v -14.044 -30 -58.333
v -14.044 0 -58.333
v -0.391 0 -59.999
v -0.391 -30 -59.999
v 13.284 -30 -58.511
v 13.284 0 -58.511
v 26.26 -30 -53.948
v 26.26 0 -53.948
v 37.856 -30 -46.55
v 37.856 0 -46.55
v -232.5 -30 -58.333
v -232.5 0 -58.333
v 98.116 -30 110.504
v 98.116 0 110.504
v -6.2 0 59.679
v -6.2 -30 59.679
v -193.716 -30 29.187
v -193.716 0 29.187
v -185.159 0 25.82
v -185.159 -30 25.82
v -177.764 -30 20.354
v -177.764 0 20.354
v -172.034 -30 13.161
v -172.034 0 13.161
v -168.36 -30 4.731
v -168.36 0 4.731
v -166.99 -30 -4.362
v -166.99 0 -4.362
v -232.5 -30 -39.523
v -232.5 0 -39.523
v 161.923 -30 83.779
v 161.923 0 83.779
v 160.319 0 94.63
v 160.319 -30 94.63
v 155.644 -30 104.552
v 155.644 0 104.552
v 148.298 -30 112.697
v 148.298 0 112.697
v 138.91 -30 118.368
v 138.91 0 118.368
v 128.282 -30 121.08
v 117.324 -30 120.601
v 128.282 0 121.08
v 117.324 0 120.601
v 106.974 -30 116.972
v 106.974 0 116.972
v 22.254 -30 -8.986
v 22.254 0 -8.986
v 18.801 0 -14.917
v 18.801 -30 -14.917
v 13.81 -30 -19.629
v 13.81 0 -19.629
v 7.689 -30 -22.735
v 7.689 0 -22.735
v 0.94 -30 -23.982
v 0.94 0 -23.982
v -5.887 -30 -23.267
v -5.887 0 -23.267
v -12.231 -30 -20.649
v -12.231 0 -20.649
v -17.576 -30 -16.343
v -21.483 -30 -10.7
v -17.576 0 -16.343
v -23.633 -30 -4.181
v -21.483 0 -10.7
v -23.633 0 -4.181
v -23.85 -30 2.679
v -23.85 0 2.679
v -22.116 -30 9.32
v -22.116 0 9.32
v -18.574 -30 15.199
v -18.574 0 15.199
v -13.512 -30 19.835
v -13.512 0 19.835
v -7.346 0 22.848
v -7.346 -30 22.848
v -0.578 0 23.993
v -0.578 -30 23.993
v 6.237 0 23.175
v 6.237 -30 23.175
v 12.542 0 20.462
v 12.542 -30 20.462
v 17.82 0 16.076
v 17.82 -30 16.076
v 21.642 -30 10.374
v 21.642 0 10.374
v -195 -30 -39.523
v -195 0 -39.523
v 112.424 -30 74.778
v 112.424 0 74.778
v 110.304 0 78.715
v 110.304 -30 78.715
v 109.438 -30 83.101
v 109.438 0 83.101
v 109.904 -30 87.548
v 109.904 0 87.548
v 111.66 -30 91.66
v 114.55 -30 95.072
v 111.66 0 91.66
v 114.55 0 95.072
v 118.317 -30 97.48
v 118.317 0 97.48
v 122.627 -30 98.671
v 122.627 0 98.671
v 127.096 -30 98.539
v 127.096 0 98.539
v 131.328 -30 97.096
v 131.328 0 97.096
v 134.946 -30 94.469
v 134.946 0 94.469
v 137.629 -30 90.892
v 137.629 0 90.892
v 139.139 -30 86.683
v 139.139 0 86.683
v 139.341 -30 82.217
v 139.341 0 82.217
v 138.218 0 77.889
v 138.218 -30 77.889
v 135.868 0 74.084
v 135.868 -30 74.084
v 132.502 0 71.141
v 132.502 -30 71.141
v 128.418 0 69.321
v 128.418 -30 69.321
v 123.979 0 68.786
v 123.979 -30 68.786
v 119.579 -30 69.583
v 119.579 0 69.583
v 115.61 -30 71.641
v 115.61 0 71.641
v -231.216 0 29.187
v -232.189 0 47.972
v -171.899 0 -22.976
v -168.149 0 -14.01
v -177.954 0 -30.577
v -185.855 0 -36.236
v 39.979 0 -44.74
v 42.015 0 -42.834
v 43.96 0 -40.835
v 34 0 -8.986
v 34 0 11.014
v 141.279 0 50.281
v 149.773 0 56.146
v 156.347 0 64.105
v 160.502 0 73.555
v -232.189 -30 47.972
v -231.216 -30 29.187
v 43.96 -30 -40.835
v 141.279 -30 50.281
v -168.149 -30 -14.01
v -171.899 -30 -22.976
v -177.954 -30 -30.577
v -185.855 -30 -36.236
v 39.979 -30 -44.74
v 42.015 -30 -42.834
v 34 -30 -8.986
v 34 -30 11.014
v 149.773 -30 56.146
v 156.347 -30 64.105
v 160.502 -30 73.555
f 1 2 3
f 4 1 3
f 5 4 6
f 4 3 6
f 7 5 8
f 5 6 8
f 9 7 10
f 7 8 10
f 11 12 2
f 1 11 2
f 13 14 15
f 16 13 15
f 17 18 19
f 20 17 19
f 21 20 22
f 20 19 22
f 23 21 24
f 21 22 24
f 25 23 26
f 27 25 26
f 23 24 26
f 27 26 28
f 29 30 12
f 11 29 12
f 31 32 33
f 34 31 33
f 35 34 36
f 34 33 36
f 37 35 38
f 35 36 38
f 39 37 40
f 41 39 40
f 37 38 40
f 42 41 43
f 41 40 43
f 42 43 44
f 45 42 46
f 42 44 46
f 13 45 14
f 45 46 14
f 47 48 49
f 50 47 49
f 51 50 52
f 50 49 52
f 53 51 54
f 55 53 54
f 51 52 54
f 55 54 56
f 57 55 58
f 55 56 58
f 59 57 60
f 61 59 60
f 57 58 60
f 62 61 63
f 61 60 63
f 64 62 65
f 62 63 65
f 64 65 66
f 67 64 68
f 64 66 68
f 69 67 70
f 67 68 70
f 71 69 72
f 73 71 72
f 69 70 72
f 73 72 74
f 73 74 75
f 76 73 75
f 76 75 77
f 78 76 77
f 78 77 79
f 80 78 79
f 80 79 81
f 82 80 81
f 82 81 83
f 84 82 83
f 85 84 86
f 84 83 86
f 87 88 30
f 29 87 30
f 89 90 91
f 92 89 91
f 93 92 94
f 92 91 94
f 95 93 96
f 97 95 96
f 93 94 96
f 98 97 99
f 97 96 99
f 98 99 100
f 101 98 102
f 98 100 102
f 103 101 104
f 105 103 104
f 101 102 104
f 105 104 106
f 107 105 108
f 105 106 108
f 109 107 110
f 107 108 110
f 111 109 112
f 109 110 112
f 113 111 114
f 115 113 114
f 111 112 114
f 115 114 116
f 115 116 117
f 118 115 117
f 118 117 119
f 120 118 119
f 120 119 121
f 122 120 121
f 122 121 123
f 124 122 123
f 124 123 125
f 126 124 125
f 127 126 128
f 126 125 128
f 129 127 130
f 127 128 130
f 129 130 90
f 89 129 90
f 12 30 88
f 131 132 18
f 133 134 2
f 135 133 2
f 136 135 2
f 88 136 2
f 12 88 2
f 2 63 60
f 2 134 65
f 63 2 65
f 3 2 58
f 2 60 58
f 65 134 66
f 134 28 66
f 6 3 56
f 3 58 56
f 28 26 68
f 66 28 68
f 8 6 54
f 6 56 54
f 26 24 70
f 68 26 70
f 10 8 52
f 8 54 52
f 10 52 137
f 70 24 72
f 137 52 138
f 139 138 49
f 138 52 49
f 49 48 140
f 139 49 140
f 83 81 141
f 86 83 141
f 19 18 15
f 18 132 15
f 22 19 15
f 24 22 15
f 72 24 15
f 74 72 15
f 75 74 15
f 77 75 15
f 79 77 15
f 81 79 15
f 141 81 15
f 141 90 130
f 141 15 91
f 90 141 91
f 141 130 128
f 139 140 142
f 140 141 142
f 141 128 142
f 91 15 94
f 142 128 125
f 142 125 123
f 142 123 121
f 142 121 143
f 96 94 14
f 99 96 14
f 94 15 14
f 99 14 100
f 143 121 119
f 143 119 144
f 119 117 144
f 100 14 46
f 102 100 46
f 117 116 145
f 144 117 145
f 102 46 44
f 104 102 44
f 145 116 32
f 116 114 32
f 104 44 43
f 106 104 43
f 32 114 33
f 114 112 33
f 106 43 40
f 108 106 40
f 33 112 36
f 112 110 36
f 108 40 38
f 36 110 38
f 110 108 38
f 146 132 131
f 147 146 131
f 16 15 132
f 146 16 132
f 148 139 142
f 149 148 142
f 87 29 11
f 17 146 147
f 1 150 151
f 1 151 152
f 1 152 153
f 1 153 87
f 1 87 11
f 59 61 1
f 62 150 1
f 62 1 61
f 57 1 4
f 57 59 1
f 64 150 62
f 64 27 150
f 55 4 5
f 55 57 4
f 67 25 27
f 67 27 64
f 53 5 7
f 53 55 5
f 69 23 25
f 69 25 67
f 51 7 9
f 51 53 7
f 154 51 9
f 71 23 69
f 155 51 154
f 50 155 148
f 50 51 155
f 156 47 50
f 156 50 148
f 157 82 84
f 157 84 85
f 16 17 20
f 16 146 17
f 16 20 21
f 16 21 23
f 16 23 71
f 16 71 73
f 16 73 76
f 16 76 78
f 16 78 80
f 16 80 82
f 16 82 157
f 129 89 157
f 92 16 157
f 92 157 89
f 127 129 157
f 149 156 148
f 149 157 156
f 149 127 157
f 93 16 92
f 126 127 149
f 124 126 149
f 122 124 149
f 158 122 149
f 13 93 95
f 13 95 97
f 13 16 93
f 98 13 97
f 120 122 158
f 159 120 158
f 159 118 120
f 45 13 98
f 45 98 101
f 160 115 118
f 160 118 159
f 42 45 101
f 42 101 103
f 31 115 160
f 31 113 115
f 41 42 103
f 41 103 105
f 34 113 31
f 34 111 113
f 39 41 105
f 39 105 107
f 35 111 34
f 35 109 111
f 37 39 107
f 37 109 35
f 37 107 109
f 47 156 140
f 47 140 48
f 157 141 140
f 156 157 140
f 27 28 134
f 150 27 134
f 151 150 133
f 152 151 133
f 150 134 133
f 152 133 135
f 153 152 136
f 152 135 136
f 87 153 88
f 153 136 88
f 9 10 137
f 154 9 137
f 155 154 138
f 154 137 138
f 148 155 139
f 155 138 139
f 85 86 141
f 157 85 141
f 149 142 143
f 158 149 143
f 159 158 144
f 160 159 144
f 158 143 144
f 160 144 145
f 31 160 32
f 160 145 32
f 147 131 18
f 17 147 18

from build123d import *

# Parameters (mm, degrees)
F1_DEPTH = 30


with BuildPart() as f1:
    # F0 (on Front) → F1 (new body)
    with BuildSketch(Plane.XZ):
        with BuildLine():
            ThreePointArc((43.9601876184, -40.8350572983), (55.8462678122, -21.9361430395), (60, 0))
            ThreePointArc((60, 0), (59.3271357487, 8.9605225212), (57.3236345382, 17.7200711998))
            ThreePointArc((57.3236345382, 17.7200711998), (35.6145737586, 48.286666234), (0, 60))
            Line((0, 60), (-6.1995762038, 59.678850985))
            ThreePointArc((-6.1995762038, 59.678850985), (-45.9961514375, 38.5273156726), (-59.8412528078, -4.3617040695))
            ThreePointArc((-59.8412528078, -4.3617040695), (-45.749304661, -38.8201123522), (-14.0443202253, -58.3331558328))
            ThreePointArc((-14.0443202253, -58.3331558328), (13.2837711962, -58.5110367607), (37.8560106248, -46.5502143881))
            Line((37.8560106248, -46.5502143881), (43.9601876184, -40.8350572983))
        make_face()
        with BuildLine():
            ThreePointArc((22.2544550068, -8.9855012298), (-23.9879968678, -0.7589507694), (21.6419337451, 10.3743290757))
            Line((21.6419337451, 10.3743290757), (34, 11.0144987702))
            Line((34, 11.0144987702), (34, -8.9855012298))
            Line((34, -8.9855012298), (22.2544550068, -8.9855012298))
        make_face(mode=Mode.SUBTRACT)
        with BuildLine():
            ThreePointArc((57.3236345382, 17.7200711998), (59.3271357487, 8.9605225212), (60, 0))
            ThreePointArc((60, 0), (55.8462678122, -21.9361430395), (43.9601876184, -40.8350572983))
            Line((43.9601876184, -40.8350572983), (141.2785439355, 50.2811889465))
            ThreePointArc((141.2785439355, 50.2811889465), (117.6128786081, 46.9029106044), (96.7146143427, 58.5106248772))
            Line((96.7146143427, 58.5106248772), (57.3236345382, 17.7200711998))
        make_face()
        with BuildLine():
            ThreePointArc((0, 60), (35.6145737586, 48.286666234), (57.3236345382, 17.7200711998))
            Line((57.3236345382, 17.7200711998), (96.7146143427, 58.5106248772))
            ThreePointArc((96.7146143427, 58.5106248772), (86.9363192525, 84.7896597627), (98.1158209388, 110.5038867865))
            Line((98.1158209388, 110.5038867865), (-6.1995762038, 59.678850985))
            ThreePointArc((-6.1995762038, 59.678850985), (-3.1039443373, 59.9196589572), (0, 60))
        make_face()
        with BuildLine():
            ThreePointArc((37.8560106248, -46.5502143881), (41.0077837597, -43.7991058255), (43.9601876184, -40.8350572983))
            Line((43.9601876184, -40.8350572983), (37.8560106248, -46.5502143881))
        make_face()
        with BuildLine():
            Line((-6.1995762038, 59.678850985), (0, 60))
            ThreePointArc((0, 60), (-3.1039443373, 59.9196589572), (-6.1995762038, 59.678850985))
        make_face()
        with BuildLine():
            ThreePointArc((98.1158209388, 110.5038867865), (86.9363192525, 84.7896597627), (96.7146143427, 58.5106248772))
            ThreePointArc((96.7146143427, 58.5106248772), (117.6128786081, 46.9029106044), (141.2785439355, 50.2811889465))
            ThreePointArc((141.2785439355, 50.2811889465), (156.3471806883, 64.105109847), (161.9227087237, 83.779410083))
            ThreePointArc((161.9227087237, 83.779410083), (138.9096288254, 118.3681242246), (98.1158209388, 110.5038867865))
        make_face()
        with BuildLine():
            ThreePointArc((139.4227087237, 83.779410083), (129.1669853294, 69.5494473463), (112.4237967918, 74.7779595082))
            ThreePointArc((112.4237967918, 74.7779595082), (119.678432118, 98.0093728198), (139.4227087237, 83.779410083))
        make_face(mode=Mode.SUBTRACT)
        with BuildLine():
            ThreePointArc((-59.8412528078, -4.3617040695), (-45.9961514375, 38.5273156726), (-6.1995762038, 59.678850985))
            Line((-6.1995762038, 59.678850985), (-232.1886784593, 47.9722156929))
            Line((-232.1886784593, 47.9722156929), (-231.2155919095, 29.1874026098))
            Line((-231.2155919095, 29.1874026098), (-193.7155919095, 29.1874026098))
            ThreePointArc((-193.7155919095, 29.1874026098), (-174.663504004, 16.9450214035), (-166.9900822915, -4.3617040695))
            Line((-166.9900822915, -4.3617040695), (-59.8412528078, -4.3617040695))
        make_face()
        with BuildLine():
            Line((-232.5, -58.3331558328), (-14.0443202253, -58.3331558328))
            ThreePointArc((-14.0443202253, -58.3331558328), (-45.749304661, -38.8201123522), (-59.8412528078, -4.3617040695))
            Line((-59.8412528078, -4.3617040695), (-166.9900822915, -4.3617040695))
            ThreePointArc((-166.9900822915, -4.3617040695), (-174.663504004, -26.9861874019), (-195, -39.5231558328))
            Line((-195, -39.5231558328), (-232.5, -39.5231558328))
            Line((-232.5, -39.5231558328), (-232.5, -58.3331558328))
        make_face()
    extrude(amount=F1_DEPTH)


solid = f1.part
